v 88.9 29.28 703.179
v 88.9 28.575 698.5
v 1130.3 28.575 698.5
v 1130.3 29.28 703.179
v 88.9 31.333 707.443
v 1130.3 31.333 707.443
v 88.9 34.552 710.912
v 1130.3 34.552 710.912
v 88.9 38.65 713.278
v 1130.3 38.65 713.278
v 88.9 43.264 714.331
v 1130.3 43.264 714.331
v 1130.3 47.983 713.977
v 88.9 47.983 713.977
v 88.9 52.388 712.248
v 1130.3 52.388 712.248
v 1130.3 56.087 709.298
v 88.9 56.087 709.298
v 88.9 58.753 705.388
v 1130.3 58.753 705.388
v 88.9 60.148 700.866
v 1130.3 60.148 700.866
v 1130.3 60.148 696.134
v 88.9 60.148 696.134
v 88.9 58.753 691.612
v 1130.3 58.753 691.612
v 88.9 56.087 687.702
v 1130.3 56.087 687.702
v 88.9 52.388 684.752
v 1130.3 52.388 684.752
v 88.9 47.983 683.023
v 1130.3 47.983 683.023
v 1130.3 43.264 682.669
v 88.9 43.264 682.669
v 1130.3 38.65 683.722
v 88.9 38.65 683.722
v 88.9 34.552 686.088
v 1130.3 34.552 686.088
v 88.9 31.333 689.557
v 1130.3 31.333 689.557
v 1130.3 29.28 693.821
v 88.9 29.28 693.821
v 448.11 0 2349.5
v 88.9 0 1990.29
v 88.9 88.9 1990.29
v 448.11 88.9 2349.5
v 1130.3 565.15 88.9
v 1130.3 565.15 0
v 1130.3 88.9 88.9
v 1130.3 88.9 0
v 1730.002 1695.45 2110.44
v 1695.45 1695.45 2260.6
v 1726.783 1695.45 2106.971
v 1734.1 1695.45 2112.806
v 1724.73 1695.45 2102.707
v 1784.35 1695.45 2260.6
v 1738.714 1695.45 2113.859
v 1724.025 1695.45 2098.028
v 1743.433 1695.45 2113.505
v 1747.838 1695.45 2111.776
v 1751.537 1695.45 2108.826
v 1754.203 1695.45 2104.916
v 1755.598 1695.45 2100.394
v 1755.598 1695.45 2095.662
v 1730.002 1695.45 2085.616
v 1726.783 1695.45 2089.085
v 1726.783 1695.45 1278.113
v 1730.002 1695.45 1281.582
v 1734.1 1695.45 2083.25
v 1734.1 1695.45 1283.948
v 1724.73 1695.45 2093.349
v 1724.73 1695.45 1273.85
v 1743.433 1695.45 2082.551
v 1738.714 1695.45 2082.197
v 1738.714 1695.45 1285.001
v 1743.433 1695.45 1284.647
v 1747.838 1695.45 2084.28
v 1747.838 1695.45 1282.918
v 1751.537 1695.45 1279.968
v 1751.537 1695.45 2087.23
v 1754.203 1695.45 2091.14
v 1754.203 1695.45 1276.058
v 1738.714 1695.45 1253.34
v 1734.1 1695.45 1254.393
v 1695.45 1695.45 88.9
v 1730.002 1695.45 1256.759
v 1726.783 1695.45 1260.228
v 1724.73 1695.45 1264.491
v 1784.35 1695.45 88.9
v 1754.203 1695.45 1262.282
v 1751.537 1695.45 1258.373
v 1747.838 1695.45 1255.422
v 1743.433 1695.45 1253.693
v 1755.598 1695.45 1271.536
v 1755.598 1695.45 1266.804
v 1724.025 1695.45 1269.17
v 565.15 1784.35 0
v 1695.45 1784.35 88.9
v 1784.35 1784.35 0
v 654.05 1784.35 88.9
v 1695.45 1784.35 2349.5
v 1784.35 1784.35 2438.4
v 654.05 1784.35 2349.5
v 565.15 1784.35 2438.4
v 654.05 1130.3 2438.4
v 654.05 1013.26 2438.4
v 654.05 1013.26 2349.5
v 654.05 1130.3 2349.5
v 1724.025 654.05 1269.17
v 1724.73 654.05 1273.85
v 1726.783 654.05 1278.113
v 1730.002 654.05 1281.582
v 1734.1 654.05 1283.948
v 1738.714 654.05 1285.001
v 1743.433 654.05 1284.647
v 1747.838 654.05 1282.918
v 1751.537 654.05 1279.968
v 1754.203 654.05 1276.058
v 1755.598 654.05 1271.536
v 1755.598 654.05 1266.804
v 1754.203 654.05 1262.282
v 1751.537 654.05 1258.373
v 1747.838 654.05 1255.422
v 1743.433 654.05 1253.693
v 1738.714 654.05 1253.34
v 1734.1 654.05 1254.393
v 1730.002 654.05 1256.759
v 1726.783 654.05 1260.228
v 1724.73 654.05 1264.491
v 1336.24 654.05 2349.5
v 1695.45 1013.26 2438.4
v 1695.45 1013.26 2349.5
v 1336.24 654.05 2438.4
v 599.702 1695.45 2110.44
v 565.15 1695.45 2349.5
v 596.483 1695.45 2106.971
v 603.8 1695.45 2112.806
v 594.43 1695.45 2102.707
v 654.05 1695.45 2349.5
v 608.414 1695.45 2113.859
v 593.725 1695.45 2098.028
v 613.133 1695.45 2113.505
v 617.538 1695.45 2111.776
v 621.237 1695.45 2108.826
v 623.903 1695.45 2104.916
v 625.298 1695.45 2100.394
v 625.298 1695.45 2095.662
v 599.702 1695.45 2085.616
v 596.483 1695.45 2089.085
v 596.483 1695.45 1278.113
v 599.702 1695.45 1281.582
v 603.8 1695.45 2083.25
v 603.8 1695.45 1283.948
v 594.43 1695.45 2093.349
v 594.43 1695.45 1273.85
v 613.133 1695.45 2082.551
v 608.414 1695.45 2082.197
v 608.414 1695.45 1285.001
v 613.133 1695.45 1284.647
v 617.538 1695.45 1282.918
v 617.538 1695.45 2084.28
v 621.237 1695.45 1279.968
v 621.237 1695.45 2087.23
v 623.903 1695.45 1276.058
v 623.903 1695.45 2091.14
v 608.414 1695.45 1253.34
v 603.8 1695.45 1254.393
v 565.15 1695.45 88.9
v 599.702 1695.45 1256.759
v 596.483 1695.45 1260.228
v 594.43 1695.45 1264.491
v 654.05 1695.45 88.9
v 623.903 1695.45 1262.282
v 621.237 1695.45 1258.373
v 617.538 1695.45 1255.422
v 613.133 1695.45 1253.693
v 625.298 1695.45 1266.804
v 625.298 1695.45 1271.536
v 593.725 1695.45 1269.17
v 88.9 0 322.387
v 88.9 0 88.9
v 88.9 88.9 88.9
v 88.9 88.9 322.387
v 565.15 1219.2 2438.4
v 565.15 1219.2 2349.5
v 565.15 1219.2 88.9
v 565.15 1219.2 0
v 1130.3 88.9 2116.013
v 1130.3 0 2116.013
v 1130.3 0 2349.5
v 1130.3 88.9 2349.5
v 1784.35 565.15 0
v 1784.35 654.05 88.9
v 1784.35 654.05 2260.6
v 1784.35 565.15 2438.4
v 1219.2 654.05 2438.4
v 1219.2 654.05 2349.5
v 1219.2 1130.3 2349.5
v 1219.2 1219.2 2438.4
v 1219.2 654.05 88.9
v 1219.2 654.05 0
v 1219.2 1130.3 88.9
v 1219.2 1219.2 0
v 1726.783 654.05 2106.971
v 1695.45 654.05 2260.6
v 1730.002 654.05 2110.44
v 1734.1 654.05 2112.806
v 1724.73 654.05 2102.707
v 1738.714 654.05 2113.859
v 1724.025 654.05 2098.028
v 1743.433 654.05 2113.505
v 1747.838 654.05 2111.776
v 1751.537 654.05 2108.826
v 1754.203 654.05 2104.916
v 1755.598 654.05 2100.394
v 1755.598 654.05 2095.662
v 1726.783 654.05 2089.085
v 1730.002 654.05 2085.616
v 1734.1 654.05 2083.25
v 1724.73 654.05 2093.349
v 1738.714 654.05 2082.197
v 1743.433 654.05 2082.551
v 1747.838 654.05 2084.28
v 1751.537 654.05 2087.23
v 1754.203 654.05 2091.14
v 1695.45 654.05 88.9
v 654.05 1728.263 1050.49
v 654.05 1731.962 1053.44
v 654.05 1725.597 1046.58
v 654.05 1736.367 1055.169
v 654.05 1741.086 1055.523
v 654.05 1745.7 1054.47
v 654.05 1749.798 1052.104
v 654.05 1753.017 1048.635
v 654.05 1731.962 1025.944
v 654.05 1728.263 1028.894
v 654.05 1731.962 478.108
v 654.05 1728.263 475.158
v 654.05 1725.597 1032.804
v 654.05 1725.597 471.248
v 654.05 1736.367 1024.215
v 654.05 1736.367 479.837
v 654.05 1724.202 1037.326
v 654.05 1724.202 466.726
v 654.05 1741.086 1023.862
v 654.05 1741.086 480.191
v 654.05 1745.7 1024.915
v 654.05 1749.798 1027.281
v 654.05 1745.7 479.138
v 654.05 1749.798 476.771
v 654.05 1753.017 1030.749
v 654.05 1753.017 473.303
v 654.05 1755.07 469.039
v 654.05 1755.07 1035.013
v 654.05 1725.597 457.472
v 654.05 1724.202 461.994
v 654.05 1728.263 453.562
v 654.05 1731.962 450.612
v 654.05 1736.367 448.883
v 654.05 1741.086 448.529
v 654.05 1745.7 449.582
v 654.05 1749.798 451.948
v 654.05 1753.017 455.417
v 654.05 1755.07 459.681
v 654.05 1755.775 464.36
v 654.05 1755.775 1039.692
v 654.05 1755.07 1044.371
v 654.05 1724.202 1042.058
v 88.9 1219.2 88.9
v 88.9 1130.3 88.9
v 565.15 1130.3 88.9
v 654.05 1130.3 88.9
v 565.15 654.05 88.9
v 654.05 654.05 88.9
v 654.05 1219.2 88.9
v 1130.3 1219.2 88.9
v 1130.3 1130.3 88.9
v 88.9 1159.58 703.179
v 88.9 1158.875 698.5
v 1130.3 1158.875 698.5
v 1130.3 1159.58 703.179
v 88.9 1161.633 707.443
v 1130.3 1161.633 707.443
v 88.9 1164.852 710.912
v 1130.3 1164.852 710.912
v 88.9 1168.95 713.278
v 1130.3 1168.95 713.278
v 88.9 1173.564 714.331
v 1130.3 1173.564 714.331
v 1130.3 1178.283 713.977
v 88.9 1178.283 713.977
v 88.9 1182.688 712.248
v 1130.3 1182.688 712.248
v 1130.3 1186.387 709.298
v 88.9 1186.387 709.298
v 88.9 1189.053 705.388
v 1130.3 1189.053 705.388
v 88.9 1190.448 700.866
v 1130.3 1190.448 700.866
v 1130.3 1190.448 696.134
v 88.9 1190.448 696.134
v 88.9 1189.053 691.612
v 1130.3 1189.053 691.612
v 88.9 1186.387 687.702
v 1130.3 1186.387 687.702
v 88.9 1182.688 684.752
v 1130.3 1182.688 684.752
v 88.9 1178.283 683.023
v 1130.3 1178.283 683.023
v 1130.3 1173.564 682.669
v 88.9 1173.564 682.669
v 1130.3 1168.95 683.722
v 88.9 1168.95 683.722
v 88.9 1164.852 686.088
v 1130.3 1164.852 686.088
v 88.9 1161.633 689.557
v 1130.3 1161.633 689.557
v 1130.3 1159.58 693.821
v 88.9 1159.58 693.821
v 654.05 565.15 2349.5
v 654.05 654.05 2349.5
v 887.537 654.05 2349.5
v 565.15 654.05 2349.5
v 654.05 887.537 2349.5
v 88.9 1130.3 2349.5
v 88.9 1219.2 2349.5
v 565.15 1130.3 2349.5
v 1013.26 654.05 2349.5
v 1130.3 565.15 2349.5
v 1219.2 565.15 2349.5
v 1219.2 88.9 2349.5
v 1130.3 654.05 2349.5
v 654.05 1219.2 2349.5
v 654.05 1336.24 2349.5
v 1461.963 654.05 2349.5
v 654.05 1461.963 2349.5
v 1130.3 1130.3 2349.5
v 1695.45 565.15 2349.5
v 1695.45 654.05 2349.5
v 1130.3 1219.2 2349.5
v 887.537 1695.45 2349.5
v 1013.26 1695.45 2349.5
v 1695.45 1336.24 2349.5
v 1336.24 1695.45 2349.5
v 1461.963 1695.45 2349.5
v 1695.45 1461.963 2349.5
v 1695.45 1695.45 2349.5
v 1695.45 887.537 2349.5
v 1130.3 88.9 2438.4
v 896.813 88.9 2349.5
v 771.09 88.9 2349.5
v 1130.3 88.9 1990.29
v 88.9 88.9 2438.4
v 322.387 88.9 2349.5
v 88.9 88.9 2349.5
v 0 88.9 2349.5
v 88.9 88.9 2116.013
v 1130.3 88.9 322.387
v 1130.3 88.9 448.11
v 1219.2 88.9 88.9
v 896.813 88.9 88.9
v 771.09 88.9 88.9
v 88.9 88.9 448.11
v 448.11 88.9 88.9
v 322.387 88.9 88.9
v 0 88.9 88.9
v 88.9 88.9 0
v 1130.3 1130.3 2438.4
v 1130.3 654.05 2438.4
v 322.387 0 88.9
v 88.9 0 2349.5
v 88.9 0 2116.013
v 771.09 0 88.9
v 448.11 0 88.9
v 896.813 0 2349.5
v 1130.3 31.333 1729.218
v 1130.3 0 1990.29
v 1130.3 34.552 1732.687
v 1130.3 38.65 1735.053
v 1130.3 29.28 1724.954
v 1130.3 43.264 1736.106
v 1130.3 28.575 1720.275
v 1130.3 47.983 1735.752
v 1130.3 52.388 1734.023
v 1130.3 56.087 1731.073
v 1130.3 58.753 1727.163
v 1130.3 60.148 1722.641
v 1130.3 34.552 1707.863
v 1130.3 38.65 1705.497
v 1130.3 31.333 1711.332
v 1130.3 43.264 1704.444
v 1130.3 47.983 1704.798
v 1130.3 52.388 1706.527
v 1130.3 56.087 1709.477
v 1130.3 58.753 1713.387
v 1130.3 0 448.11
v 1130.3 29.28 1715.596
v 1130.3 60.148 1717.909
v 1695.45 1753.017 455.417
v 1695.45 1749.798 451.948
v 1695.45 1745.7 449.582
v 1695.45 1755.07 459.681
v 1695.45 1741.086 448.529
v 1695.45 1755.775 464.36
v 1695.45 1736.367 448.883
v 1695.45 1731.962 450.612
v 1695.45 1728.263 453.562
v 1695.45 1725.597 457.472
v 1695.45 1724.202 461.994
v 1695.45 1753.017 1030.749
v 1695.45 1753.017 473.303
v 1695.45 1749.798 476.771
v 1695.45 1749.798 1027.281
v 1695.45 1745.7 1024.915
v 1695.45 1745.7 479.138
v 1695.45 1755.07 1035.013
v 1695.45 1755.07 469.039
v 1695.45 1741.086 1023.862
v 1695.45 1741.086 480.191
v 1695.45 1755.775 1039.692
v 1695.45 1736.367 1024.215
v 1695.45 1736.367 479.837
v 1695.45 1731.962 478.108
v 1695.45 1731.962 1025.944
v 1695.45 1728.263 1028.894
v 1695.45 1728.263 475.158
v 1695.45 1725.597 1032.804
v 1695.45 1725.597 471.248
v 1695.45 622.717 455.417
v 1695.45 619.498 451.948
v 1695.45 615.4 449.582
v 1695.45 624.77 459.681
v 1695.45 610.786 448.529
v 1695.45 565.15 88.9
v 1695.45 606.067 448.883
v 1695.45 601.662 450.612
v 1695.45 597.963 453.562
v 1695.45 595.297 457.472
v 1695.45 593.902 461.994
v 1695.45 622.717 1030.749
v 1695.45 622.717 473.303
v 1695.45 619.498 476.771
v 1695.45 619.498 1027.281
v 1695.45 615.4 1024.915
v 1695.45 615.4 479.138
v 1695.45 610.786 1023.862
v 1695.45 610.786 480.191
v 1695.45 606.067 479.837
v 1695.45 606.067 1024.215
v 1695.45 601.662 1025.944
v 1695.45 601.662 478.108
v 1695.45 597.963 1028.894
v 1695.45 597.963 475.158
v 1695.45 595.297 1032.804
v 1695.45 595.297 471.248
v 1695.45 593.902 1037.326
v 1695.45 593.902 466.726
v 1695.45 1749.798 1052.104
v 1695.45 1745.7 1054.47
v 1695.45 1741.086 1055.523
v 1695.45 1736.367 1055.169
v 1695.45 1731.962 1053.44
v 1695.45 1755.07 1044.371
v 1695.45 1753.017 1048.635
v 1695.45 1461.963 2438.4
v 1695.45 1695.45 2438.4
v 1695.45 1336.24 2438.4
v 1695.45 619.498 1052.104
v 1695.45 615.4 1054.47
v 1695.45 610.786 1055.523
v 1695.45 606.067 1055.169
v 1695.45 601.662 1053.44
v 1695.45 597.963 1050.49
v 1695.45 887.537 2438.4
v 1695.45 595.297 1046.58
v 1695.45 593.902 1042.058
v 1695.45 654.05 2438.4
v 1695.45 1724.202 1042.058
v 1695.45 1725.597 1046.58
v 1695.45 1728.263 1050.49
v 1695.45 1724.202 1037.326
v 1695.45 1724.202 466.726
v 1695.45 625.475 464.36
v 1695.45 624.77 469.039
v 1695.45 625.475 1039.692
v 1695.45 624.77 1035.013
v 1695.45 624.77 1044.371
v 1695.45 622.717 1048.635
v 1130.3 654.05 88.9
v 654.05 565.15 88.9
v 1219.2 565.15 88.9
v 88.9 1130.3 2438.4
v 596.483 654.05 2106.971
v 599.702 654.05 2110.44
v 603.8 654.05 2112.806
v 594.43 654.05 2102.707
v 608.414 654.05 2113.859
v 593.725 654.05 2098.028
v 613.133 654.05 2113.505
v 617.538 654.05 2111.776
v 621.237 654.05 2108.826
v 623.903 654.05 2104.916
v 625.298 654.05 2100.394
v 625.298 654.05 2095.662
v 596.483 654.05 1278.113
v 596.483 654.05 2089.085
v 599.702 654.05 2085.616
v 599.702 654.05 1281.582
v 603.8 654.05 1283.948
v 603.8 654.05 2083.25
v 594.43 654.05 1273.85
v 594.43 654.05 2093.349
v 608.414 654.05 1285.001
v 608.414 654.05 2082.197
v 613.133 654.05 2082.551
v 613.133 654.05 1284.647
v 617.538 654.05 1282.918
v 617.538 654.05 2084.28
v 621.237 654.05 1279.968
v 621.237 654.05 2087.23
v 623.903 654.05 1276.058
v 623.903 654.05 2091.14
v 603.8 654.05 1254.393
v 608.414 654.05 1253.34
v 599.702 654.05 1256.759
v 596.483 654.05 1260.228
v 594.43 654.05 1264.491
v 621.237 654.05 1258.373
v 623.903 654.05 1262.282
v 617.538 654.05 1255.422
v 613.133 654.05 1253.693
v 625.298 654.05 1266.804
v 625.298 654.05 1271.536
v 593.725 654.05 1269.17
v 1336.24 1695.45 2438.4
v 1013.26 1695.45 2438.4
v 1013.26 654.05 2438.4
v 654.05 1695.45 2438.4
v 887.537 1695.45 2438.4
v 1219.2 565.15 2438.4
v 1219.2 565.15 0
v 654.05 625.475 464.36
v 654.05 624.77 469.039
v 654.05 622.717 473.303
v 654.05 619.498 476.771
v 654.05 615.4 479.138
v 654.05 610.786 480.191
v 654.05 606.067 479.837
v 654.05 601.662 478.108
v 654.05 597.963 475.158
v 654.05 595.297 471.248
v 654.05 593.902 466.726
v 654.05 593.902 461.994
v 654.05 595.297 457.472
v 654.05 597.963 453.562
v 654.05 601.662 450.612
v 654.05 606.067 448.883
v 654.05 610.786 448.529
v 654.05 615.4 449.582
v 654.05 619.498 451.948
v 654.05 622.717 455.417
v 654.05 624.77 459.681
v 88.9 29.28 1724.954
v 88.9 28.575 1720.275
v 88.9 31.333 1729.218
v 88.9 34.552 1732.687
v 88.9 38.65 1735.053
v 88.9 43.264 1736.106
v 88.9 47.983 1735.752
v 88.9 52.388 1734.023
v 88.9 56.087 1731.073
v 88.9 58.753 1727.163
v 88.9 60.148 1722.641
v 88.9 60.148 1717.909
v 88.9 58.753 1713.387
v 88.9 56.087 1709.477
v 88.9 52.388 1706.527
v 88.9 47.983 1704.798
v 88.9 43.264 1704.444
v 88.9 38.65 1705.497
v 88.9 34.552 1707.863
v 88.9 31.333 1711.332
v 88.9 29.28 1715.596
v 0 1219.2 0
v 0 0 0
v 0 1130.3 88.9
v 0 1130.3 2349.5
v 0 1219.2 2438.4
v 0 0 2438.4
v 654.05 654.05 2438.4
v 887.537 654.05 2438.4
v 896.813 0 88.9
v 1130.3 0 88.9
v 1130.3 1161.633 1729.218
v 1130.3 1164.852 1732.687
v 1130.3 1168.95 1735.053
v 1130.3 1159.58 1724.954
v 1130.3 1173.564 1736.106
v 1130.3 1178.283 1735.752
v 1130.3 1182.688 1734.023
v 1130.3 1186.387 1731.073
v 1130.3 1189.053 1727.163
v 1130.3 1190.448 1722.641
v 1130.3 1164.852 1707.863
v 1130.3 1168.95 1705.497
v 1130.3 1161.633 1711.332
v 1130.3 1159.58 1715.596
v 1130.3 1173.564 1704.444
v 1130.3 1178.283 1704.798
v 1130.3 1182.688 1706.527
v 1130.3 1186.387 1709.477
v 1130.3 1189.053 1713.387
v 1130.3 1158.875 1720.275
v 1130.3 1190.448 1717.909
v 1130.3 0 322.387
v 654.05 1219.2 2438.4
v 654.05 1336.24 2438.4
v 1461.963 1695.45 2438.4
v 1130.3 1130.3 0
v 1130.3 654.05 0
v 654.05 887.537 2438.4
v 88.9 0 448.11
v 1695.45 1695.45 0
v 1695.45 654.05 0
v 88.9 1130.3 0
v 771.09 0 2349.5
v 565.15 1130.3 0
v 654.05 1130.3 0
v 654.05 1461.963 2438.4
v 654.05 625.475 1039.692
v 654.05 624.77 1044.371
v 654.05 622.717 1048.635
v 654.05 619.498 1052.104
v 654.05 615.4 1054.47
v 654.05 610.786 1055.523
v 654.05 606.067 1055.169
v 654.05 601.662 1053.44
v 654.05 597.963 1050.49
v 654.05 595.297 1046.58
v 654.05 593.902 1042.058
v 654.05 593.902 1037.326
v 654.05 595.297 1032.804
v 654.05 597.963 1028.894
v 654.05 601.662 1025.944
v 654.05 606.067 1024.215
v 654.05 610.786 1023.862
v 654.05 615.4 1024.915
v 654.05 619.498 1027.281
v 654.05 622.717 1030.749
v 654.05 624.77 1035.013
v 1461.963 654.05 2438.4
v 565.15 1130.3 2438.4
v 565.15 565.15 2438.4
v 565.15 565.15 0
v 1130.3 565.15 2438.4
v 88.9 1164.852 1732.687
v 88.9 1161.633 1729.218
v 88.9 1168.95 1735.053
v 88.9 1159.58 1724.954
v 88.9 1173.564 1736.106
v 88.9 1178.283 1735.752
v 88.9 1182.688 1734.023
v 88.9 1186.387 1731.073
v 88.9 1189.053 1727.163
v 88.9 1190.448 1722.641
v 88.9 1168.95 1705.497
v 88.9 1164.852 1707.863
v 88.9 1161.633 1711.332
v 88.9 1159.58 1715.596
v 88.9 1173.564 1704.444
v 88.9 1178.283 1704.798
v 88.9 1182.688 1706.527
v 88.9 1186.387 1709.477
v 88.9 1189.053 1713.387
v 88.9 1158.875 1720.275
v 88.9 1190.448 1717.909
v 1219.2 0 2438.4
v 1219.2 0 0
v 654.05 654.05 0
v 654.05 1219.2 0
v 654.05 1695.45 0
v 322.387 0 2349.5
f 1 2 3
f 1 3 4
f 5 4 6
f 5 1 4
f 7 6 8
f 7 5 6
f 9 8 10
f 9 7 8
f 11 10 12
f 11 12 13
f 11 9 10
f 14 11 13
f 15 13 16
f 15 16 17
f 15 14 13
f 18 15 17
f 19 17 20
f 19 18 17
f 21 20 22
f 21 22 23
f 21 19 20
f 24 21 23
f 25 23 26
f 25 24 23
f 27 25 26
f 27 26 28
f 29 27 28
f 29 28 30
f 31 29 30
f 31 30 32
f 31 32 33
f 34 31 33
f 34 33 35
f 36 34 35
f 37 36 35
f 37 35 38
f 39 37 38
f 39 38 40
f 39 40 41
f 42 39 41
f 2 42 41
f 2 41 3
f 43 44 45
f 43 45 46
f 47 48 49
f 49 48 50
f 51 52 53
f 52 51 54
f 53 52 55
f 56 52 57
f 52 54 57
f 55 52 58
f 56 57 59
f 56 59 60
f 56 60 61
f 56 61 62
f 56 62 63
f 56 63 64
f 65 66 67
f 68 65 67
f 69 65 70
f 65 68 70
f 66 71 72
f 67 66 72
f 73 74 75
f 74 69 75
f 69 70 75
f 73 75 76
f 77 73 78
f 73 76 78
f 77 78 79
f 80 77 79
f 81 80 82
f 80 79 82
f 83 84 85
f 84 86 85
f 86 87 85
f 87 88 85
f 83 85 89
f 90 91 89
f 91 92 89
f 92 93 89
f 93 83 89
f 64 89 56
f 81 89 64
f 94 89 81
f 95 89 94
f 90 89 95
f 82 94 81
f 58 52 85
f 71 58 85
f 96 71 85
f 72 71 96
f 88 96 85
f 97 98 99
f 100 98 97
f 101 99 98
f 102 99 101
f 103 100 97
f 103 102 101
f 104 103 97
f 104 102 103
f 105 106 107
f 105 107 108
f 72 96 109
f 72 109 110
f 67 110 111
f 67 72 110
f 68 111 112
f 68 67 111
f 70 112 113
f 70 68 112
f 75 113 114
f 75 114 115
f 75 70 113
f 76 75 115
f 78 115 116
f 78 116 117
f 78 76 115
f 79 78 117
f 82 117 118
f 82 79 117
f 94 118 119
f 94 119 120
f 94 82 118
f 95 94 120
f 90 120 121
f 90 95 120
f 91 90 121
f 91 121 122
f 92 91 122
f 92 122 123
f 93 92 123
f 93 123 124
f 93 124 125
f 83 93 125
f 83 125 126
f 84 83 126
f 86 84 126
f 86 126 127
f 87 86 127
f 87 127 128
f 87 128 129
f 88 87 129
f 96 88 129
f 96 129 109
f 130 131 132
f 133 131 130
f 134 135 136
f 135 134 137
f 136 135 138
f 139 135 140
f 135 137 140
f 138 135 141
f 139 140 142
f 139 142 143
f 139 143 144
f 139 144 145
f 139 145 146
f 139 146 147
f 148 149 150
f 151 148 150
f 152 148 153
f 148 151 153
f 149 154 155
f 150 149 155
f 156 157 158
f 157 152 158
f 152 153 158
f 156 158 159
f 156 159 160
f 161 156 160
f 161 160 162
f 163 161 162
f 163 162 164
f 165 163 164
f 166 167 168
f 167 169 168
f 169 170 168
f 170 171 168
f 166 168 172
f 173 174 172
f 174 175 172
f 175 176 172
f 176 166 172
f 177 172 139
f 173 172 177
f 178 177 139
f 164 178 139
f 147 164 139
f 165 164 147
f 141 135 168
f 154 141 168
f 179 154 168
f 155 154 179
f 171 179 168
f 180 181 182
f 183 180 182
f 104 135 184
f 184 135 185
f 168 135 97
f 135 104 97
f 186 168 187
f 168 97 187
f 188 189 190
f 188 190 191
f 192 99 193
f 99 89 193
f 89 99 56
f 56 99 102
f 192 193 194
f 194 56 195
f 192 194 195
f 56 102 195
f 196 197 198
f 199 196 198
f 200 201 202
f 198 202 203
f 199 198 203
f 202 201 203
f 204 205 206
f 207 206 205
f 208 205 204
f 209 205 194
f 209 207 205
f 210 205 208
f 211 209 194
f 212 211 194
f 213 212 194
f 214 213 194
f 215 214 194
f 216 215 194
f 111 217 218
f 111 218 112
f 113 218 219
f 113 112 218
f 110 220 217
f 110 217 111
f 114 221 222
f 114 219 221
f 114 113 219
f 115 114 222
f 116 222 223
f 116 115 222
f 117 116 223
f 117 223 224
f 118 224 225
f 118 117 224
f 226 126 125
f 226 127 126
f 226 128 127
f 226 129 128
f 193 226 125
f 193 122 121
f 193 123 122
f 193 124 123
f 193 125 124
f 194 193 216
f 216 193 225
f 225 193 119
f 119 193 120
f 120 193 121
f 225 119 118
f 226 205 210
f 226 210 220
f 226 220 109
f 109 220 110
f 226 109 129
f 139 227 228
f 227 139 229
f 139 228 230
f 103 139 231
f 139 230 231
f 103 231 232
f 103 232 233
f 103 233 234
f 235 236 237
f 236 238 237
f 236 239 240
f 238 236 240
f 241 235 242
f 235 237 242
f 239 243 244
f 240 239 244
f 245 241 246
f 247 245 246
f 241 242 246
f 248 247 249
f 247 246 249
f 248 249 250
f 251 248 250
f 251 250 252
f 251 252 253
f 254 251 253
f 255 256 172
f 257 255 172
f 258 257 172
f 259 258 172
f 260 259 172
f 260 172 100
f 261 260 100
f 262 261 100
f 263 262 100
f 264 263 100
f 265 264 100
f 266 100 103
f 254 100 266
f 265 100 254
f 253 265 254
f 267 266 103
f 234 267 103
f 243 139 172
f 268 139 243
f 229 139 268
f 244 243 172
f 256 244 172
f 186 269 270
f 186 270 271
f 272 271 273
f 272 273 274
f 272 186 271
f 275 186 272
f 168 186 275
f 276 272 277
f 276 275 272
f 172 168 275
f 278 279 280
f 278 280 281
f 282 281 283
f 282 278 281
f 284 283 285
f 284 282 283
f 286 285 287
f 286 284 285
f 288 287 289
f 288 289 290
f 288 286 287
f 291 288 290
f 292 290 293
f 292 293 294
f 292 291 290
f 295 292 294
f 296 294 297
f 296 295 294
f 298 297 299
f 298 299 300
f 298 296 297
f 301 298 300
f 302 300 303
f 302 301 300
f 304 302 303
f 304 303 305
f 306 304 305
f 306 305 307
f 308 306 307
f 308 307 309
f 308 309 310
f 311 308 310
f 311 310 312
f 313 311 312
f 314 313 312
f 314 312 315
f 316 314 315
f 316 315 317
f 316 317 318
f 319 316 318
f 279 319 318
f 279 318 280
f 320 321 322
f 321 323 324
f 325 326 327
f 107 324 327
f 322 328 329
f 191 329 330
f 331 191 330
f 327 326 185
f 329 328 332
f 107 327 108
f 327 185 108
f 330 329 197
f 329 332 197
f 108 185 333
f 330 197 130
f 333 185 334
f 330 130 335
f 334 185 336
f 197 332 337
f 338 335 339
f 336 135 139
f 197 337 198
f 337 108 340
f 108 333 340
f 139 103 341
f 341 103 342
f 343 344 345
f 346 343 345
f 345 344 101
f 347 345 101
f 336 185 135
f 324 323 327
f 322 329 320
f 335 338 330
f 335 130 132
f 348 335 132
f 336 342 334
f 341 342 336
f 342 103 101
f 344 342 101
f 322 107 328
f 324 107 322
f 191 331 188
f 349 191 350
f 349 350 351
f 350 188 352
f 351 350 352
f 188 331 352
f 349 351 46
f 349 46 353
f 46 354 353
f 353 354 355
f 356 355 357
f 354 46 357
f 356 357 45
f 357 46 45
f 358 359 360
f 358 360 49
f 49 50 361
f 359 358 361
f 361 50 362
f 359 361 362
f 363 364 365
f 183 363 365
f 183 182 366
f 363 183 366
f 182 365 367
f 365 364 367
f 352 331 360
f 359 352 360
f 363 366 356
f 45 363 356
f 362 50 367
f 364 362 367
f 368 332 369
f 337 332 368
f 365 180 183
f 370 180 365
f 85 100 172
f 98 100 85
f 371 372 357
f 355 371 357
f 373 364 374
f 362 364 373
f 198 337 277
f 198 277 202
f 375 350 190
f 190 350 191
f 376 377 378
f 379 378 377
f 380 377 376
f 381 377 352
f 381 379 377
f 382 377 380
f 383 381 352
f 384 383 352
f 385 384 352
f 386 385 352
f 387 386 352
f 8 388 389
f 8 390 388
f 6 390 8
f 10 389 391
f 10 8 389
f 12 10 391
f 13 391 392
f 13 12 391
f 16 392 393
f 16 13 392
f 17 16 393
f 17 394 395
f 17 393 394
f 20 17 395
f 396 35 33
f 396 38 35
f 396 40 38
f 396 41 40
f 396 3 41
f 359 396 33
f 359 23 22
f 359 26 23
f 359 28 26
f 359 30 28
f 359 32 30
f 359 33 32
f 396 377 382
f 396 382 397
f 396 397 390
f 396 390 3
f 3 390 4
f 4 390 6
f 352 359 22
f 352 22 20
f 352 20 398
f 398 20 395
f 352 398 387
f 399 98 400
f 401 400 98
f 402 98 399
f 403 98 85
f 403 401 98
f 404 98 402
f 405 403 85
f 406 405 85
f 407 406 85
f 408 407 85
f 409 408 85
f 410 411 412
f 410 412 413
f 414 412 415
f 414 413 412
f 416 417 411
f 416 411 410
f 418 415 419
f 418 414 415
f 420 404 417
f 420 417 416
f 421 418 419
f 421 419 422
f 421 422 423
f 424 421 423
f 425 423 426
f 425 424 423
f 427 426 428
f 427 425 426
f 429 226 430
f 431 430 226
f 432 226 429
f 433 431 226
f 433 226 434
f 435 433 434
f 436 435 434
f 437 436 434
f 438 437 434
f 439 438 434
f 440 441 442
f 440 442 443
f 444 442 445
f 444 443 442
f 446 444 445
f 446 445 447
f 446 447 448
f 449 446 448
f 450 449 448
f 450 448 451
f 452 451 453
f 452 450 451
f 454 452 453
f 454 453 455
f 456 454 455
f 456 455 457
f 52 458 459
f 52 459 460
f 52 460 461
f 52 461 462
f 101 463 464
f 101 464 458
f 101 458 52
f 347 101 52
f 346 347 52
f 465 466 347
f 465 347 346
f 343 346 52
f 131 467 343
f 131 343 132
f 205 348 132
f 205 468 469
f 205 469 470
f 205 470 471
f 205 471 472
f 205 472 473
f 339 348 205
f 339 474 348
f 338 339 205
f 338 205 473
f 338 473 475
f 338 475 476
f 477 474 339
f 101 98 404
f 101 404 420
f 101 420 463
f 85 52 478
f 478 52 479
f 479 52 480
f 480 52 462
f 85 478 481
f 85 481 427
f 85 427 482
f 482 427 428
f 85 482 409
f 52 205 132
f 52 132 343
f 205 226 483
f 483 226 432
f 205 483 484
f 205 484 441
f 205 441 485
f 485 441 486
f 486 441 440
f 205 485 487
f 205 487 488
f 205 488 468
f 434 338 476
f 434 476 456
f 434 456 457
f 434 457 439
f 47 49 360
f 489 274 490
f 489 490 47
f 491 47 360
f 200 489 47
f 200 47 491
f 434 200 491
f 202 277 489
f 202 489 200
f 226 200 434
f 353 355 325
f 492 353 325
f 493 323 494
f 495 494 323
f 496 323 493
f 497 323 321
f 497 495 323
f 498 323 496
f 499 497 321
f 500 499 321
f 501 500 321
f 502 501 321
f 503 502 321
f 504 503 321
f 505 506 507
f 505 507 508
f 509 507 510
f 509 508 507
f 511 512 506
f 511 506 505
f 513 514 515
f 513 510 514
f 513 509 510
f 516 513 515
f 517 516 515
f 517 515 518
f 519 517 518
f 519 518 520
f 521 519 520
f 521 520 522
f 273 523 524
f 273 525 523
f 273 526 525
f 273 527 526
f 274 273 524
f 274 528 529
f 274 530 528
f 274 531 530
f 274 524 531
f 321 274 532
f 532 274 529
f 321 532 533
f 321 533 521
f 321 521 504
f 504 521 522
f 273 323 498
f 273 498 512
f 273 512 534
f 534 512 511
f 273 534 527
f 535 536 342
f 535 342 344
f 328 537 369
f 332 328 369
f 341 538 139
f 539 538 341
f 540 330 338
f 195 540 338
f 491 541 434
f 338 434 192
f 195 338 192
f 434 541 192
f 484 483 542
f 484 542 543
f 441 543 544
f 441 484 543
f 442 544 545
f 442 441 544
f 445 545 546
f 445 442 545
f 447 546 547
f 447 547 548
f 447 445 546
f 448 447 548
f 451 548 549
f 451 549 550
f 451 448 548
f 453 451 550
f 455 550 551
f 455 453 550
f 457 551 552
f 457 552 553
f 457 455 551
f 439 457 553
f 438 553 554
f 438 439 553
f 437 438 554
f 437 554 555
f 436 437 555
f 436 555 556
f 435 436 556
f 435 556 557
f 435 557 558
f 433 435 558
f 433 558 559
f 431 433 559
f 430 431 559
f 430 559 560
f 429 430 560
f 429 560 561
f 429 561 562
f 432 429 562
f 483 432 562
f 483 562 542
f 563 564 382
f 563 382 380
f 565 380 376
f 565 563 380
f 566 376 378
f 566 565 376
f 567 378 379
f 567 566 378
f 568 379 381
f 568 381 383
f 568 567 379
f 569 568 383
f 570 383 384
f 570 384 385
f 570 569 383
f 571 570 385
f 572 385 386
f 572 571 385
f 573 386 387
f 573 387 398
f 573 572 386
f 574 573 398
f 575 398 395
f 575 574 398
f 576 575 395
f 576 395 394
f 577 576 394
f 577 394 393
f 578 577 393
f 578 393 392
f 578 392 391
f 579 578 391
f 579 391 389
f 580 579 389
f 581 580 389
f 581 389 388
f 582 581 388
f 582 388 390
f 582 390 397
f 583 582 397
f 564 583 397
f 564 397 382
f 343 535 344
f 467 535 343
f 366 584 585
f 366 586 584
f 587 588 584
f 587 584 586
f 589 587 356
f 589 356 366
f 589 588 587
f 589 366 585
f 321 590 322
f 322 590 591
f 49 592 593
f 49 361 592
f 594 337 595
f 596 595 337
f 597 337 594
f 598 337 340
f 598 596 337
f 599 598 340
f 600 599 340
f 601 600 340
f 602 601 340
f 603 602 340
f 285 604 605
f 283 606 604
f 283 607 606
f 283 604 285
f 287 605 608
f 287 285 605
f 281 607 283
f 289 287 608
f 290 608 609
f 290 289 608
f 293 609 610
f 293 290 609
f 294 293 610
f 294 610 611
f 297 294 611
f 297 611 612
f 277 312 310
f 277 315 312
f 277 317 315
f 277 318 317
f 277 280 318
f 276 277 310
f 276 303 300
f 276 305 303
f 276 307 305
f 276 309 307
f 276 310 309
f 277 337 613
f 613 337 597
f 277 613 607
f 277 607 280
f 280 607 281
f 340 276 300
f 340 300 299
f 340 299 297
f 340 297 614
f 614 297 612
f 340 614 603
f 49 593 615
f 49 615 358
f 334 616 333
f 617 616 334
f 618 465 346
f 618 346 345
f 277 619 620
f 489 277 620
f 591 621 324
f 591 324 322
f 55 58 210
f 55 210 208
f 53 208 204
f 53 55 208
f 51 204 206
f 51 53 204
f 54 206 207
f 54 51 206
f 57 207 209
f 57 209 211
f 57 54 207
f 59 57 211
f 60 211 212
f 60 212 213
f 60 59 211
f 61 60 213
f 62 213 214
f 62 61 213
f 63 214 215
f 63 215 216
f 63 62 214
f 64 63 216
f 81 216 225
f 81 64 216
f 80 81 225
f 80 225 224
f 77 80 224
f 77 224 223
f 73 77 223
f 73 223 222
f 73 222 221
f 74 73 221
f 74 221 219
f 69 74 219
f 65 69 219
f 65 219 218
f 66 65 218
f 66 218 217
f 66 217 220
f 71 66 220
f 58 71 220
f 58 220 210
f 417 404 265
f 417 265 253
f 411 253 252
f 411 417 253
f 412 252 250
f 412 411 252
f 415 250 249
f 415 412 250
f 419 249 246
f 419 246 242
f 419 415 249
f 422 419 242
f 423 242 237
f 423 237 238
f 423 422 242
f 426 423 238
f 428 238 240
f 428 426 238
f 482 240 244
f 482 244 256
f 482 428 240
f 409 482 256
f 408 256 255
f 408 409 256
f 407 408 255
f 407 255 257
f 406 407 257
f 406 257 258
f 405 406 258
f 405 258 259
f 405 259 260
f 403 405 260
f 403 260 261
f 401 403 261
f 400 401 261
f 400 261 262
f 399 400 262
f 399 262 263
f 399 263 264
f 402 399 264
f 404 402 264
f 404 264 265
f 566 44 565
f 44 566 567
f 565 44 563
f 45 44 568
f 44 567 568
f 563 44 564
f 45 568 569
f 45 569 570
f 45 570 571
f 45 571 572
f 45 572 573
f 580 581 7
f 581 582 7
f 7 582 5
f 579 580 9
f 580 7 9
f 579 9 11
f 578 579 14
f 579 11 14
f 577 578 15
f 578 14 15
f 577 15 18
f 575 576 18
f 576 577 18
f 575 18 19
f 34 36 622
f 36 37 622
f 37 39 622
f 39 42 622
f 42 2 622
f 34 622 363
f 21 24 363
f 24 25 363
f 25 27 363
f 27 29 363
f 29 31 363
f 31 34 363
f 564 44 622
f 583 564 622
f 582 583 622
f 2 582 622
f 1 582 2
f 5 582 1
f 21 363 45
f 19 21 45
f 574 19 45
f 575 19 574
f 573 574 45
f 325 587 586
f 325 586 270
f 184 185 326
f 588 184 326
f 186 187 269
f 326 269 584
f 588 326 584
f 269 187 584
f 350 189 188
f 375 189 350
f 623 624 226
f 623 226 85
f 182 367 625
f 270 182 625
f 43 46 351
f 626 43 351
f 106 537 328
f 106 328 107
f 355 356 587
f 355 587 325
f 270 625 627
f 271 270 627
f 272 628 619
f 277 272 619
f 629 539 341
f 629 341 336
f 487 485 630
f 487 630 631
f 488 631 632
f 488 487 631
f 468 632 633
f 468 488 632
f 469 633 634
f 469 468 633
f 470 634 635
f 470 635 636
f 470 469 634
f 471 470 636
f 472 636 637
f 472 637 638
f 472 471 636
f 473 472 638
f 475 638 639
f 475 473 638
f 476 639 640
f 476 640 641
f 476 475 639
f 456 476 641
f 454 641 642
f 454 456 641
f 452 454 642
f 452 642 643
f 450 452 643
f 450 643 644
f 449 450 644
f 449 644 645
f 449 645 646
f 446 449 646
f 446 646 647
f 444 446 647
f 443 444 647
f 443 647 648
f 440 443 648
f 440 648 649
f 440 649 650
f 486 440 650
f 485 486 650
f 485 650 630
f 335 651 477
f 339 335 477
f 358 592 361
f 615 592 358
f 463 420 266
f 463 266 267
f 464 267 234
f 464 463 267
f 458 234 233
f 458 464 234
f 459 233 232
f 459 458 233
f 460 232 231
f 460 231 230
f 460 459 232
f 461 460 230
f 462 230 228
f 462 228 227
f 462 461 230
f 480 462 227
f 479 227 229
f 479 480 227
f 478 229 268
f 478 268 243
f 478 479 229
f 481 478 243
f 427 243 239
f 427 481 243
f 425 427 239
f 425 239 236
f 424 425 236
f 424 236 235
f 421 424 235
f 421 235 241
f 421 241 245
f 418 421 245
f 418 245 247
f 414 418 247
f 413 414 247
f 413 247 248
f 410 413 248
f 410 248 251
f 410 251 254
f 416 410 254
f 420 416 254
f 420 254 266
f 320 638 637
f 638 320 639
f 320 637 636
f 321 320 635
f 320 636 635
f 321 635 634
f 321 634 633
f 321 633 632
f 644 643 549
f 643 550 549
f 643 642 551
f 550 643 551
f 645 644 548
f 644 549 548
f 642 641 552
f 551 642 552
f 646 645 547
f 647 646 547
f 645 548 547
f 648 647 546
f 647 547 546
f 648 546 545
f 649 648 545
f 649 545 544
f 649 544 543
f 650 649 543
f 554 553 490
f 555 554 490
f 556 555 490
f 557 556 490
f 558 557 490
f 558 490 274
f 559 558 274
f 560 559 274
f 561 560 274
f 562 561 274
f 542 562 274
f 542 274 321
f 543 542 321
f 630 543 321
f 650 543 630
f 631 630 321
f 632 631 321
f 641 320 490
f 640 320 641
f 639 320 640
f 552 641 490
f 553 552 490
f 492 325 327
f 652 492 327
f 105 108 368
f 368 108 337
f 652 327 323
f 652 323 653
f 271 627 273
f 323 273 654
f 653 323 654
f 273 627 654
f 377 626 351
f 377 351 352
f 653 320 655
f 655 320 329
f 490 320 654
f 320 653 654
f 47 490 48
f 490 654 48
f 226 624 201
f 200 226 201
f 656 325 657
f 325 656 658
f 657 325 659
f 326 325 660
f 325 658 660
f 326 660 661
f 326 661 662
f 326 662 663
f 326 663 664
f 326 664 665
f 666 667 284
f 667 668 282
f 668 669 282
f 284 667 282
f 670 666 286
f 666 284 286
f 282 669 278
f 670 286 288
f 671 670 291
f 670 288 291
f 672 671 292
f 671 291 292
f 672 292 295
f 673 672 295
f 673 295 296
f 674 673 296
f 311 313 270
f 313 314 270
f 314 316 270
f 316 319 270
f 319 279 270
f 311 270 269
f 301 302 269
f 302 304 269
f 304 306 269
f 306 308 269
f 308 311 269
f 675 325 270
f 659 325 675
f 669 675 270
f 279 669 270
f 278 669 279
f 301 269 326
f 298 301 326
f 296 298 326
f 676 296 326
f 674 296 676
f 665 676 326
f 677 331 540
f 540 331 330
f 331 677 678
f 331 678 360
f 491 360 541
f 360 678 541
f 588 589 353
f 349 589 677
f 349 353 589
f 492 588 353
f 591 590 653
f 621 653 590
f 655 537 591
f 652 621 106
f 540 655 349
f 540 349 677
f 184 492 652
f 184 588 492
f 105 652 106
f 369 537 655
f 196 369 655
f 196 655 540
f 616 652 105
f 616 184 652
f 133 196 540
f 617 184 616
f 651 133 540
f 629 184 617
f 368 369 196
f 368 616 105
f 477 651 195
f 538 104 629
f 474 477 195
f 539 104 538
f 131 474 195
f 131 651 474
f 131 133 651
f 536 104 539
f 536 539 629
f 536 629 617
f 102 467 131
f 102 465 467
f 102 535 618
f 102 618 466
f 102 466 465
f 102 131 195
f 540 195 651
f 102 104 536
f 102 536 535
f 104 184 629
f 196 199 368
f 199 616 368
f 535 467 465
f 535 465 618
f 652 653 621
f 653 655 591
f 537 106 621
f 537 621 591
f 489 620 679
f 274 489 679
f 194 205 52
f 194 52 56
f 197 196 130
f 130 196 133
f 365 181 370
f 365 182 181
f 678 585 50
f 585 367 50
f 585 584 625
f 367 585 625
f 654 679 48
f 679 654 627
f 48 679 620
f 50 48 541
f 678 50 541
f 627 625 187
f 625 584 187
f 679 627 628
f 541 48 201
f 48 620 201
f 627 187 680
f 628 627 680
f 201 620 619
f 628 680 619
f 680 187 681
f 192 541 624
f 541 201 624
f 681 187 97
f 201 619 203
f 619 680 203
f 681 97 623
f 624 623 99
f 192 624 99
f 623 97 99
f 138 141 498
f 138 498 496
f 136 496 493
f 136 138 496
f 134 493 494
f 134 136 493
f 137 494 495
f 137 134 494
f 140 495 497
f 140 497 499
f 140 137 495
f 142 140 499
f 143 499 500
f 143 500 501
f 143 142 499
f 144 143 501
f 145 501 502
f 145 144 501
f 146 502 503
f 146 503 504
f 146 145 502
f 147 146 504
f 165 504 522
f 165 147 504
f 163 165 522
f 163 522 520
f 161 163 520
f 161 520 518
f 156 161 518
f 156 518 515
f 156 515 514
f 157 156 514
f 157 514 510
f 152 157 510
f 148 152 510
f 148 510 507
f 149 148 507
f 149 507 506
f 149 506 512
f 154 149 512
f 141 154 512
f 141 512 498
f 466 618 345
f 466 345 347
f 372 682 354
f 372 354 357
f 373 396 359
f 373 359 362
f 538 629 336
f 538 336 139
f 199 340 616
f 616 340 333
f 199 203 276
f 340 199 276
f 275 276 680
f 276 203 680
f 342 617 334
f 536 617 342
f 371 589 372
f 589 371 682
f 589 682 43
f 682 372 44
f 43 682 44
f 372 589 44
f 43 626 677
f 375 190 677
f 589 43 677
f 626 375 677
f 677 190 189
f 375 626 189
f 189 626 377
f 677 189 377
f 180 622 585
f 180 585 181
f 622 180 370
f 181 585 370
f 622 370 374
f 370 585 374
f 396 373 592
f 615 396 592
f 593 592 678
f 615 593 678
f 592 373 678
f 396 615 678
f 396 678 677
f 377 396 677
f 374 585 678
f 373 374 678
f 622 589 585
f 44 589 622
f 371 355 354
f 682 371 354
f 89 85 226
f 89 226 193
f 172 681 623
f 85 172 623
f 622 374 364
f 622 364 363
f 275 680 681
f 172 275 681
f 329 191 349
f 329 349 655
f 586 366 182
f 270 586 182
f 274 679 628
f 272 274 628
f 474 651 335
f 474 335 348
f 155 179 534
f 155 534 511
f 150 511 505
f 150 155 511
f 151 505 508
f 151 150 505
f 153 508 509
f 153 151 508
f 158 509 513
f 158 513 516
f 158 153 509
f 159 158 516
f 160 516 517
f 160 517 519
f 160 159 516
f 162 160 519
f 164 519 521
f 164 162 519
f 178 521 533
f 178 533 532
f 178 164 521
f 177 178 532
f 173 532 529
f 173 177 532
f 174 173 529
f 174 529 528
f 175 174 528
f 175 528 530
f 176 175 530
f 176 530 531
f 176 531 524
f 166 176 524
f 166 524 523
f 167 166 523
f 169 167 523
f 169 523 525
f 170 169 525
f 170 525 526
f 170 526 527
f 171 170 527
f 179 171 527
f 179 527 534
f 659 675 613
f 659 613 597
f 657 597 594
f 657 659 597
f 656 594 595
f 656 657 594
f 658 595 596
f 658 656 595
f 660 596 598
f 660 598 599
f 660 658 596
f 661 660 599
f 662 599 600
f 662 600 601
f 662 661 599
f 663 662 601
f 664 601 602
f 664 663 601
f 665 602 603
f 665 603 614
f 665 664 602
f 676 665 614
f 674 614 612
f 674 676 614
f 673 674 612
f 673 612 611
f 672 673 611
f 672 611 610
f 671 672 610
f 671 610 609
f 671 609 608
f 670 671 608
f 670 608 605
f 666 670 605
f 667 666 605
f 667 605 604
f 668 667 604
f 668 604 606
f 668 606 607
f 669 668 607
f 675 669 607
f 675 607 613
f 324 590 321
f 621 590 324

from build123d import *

# Parameters (mm, degrees)
F0_W       = 88.9
F0_H       = 88.9
F1_DEPTH   = 88.9
F2_W       = 88.9
F2_H       = 88.9
F3_DEPTH   = 2260.6
F4_W       = 88.9
F4_H       = 88.9
F4_W_2     = 1041.4
F4_H_2     = 1041.4
F5_DEPTH   = 88.9
F0_W_2     = 476.25
F0_H_2     = 1041.4
F0_W_3     = 1041.4
F0_H_3     = 476.25
F6_DEPTH   = 88.9
F7_DEPTH   = 2438.4
F8_W       = 1041.4
F8_H       = 1041.4
F8_W_2     = 88.9
F8_H_2     = 88.9
F9_DEPTH   = 88.9
F10_R      = 15.875
F11_DEPTH  = 1219.2
F12_R      = 15.875
F13_DEPTH  = 1219.2
F14_R      = 15.875
F15_DEPTH  = 1219.2
F17_DEPTH  = 88.9
F9_FACE3_W = 88.9
F9_FACE3_H = 1041.4
F19_DEPTH  = 88.9


with BuildPart() as f1:
    # F0 (on Top) → F1 (new body)
    with BuildSketch(Plane.XY):
        Polygon((1130.3, 654.05), (1219.2, 654.05), (1219.2, 1219.2), (654.05, 1219.2), (654.05, 1130.3), (1130.3, 1130.3), align=None)
        with Locations((1174.75, 609.6)):
            Rectangle(F0_W, F0_H)
        Polygon((0, 1219.2), (0, 0), (1219.2, 0), (1219.2, 565.15), (1130.3, 565.15), (1130.3, 88.9), (88.9, 88.9), (88.9, 1130.3), (565.15, 1130.3), (565.15, 1219.2), align=None)
        with Locations((609.6, 1174.75)):
            Rectangle(F0_W, F0_H)
    extrude(amount=F1_DEPTH)

    # F2 (on face) → F3 (join)
    with BuildSketch(Plane.XY.offset(88.9)):
        with Locations((44.45, 1174.75)):
            Rectangle(F2_W, F2_H)
        with Locations((1174.75, 1174.75)):
            Rectangle(F2_W, F2_H)
        with Locations((1174.75, 44.45)):
            Rectangle(F2_W, F2_H)
        with Locations((44.45, 44.45)):
            Rectangle(F2_W, F2_H)
    extrude(amount=F3_DEPTH)

    # F4 (on face) → F5 (join)
    with BuildSketch(Plane.XY.offset(2349.5)):
        with Locations((44.45, 1174.75)):
            Rectangle(F4_W, F4_H)
        Polygon((1219.2, 1219.2), (88.9, 1219.2), (88.9, 1130.3), (0, 1130.3), (0, 0), (1219.2, 0), align=None)
        with Locations((609.6, 609.6)):
            Rectangle(F4_W_2, F4_H_2, mode=Mode.SUBTRACT)
    extrude(amount=F5_DEPTH)

    # F0 (on Top) → F6 (join)
    with BuildSketch(Plane.XY):
        with Locations((1457.325, 609.6)):
            Rectangle(F0_W_2, F0_H)
        with Locations((892.175, 609.6)):
            Rectangle(F0_W_2, F0_H)
        with Locations((1739.9, 1174.75)):
            Rectangle(F0_W, F0_H_2)
        with Locations((1174.75, 1739.9)):
            Rectangle(F0_W_3, F0_H)
        with Locations((609.6, 1457.325)):
            Rectangle(F0_W, F0_H_3)
        with Locations((609.6, 892.175)):
            Rectangle(F0_W, F0_H_3)
        with Locations((1174.75, 609.6)):
            Rectangle(F0_W, F0_H)
        with Locations((609.6, 1174.75)):
            Rectangle(F0_W, F0_H)
        with Locations((1739.9, 609.6)):
            Rectangle(F0_W, F0_H)
        with Locations((1739.9, 1739.9)):
            Rectangle(F0_W, F0_H)
        with Locations((609.6, 1739.9)):
            Rectangle(F0_W, F0_H)
        with Locations((609.6, 609.6)):
            Rectangle(F0_W, F0_H)
    extrude(amount=F6_DEPTH)

    # F0 (on Top) → F7 (join)
    with BuildSketch(Plane.XY):
        with Locations((1739.9, 609.6)):
            Rectangle(F0_W, F0_H)
        with Locations((609.6, 609.6)):
            Rectangle(F0_W, F0_H)
        with Locations((609.6, 1739.9)):
            Rectangle(F0_W, F0_H)
        with Locations((1739.9, 1739.9)):
            Rectangle(F0_W, F0_H)
    extrude(amount=F7_DEPTH)

    # F8 (on face) → F9 (join)
    with BuildSketch(Plane.XY.offset(2438.4)):
        Polygon((1784.35, 1784.35), (565.15, 1784.35), (565.15, 654.05), (654.05, 654.05), (654.05, 565.15), (1784.35, 565.15), align=None)
        with Locations((1174.75, 1174.75)):
            Rectangle(F8_W, F8_H, mode=Mode.SUBTRACT)
        with Locations((609.6, 609.6)):
            Rectangle(F8_W_2, F8_H_2)
    extrude(amount=-F9_DEPTH)

    # F10 (on face) → F11 (join, through all)
    with BuildSketch(Plane(origin=(0, 0, 0), x_dir=(0, -1, 0), z_dir=(-1, 0, 0))):
        with Locations((-1174.75, 1720.2750444412)):
            Circle(F10_R)
        with Locations((-1174.75, 698.5)):
            Circle(F10_R)
        with Locations((-44.45, 1720.2750444412)):
            Circle(F10_R)
        with Locations((-44.45, 698.5)):
            Circle(F10_R)
    extrude(amount=-F11_DEPTH)

    # F12 (on face) → F13 (join, through all)
    with BuildSketch(Plane(origin=(0, 1784.35, 0), x_dir=(-1, 0, 0), z_dir=(0, 1, 0))):
        with Locations((-609.6, 2098.0279445648)):
            Circle(F12_R)
        with Locations((-609.6, 1269.1702842712)):
            Circle(F12_R)
        with Locations((-1739.9, 2098.0279445648)):
            Circle(F12_R)
        with Locations((-1739.9, 1269.1702842712)):
            Circle(F12_R)
    extrude(amount=-F13_DEPTH)

    # F14 (on face) → F15 (join, through all)
    with BuildSketch(Plane.YZ.offset(1784.35)):
        with Locations((609.6, 1039.6921634674)):
            Circle(F14_R)
        with Locations((1739.9, 1039.6921634674)):
            Circle(F14_R)
        with Locations((1739.9, 464.359909296)):
            Circle(F14_R)
        with Locations((609.6, 464.359909296)):
            Circle(F14_R)
    extrude(amount=-F15_DEPTH)

    # F16 (on face) → F17 (join, through all)
    with BuildSketch(Plane.XZ):
        Polygon((88.9, 1990.2897551572), (448.1102448428, 2349.5), (322.3866591478, 2349.5), (88.9, 2116.0133408522), align=None)
        Polygon((771.0897551572, 2349.5), (1130.3, 1990.2897551572), (1130.3, 2116.0133408522), (896.8133408522, 2349.5), align=None)
        Polygon((1130.3, 322.3866591478), (1130.3, 448.1102448428), (771.0897551572, 88.9), (896.8133408522, 88.9), align=None)
        Polygon((322.3866591478, 88.9), (448.1102448428, 88.9), (88.9, 448.1102448428), (88.9, 322.3866591478), align=None)
    extrude(amount=-F17_DEPTH)

    # F18 (on face) + F9_face3 (on face) → F19 (join)
    with BuildSketch(Plane.XY.offset(2438.4)):
        Polygon((887.5366591478, 1695.45), (654.05, 1461.9633408522), (654.05, 1336.2397551572), (1013.2602448428, 1695.45), align=None)
        Polygon((1461.9633408522, 1695.45), (1336.2397551572, 1695.45), (1695.45, 1336.2397551572), (1695.45, 1461.9633408522), align=None)
        Polygon((1695.45, 887.5366591478), (1695.45, 1013.2602448428), (1336.2397551572, 654.05), (1461.9633408522, 654.05), align=None)
        Polygon((887.5366591478, 654.05), (1013.2602448428, 654.05), (654.05, 1013.2602448428), (654.05, 887.5366591478), align=None)
    with BuildSketch(Plane(origin=(1739.9, 1174.75, 2349.5), x_dir=(1, 0, 0), z_dir=(0, 0, -1))):
        Rectangle(F9_FACE3_W, F9_FACE3_H)
    extrude(amount=-F19_DEPTH, dir=(0, 0, 1))


solid = f1.part
